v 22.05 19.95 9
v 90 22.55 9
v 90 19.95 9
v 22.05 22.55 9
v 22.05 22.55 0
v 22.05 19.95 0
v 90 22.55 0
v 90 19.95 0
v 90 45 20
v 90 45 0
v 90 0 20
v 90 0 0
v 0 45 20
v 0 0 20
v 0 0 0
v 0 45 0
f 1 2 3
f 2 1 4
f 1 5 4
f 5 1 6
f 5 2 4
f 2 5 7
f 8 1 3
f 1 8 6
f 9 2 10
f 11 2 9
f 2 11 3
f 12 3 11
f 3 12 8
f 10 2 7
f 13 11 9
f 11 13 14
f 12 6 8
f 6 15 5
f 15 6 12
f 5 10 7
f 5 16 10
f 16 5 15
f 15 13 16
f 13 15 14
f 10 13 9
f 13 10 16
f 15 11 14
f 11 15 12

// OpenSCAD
// Slide drying rack - a solid rectangular base with a row of parallel slots for standing
// microscope slides upright on their long edge. NOVEL part: a simple slot rack, not a
// parameterised grid.
//

length   = 90;
width    = 45;
height   = 20;
slots    = 10;
slot_w   = 1.6;
slot_d   = 10;
pitch    = 3.5;

$fn = 48;

top_w = width;
blow  = 0.5;                 // wall above the deepest slot

difference() {
    cube([length, width, height]);
    for (i = [0 : slots - 1])
        translate([length / 2 - (slot_w + pitch) * (slots - 1) / 2, width / 2 - (slot_w + pitch) / 2, 0])
            translate([0, 0, -1]) cube([length, slot_w + 2 * blow, slot_d]);   // open the slot through the block
}
